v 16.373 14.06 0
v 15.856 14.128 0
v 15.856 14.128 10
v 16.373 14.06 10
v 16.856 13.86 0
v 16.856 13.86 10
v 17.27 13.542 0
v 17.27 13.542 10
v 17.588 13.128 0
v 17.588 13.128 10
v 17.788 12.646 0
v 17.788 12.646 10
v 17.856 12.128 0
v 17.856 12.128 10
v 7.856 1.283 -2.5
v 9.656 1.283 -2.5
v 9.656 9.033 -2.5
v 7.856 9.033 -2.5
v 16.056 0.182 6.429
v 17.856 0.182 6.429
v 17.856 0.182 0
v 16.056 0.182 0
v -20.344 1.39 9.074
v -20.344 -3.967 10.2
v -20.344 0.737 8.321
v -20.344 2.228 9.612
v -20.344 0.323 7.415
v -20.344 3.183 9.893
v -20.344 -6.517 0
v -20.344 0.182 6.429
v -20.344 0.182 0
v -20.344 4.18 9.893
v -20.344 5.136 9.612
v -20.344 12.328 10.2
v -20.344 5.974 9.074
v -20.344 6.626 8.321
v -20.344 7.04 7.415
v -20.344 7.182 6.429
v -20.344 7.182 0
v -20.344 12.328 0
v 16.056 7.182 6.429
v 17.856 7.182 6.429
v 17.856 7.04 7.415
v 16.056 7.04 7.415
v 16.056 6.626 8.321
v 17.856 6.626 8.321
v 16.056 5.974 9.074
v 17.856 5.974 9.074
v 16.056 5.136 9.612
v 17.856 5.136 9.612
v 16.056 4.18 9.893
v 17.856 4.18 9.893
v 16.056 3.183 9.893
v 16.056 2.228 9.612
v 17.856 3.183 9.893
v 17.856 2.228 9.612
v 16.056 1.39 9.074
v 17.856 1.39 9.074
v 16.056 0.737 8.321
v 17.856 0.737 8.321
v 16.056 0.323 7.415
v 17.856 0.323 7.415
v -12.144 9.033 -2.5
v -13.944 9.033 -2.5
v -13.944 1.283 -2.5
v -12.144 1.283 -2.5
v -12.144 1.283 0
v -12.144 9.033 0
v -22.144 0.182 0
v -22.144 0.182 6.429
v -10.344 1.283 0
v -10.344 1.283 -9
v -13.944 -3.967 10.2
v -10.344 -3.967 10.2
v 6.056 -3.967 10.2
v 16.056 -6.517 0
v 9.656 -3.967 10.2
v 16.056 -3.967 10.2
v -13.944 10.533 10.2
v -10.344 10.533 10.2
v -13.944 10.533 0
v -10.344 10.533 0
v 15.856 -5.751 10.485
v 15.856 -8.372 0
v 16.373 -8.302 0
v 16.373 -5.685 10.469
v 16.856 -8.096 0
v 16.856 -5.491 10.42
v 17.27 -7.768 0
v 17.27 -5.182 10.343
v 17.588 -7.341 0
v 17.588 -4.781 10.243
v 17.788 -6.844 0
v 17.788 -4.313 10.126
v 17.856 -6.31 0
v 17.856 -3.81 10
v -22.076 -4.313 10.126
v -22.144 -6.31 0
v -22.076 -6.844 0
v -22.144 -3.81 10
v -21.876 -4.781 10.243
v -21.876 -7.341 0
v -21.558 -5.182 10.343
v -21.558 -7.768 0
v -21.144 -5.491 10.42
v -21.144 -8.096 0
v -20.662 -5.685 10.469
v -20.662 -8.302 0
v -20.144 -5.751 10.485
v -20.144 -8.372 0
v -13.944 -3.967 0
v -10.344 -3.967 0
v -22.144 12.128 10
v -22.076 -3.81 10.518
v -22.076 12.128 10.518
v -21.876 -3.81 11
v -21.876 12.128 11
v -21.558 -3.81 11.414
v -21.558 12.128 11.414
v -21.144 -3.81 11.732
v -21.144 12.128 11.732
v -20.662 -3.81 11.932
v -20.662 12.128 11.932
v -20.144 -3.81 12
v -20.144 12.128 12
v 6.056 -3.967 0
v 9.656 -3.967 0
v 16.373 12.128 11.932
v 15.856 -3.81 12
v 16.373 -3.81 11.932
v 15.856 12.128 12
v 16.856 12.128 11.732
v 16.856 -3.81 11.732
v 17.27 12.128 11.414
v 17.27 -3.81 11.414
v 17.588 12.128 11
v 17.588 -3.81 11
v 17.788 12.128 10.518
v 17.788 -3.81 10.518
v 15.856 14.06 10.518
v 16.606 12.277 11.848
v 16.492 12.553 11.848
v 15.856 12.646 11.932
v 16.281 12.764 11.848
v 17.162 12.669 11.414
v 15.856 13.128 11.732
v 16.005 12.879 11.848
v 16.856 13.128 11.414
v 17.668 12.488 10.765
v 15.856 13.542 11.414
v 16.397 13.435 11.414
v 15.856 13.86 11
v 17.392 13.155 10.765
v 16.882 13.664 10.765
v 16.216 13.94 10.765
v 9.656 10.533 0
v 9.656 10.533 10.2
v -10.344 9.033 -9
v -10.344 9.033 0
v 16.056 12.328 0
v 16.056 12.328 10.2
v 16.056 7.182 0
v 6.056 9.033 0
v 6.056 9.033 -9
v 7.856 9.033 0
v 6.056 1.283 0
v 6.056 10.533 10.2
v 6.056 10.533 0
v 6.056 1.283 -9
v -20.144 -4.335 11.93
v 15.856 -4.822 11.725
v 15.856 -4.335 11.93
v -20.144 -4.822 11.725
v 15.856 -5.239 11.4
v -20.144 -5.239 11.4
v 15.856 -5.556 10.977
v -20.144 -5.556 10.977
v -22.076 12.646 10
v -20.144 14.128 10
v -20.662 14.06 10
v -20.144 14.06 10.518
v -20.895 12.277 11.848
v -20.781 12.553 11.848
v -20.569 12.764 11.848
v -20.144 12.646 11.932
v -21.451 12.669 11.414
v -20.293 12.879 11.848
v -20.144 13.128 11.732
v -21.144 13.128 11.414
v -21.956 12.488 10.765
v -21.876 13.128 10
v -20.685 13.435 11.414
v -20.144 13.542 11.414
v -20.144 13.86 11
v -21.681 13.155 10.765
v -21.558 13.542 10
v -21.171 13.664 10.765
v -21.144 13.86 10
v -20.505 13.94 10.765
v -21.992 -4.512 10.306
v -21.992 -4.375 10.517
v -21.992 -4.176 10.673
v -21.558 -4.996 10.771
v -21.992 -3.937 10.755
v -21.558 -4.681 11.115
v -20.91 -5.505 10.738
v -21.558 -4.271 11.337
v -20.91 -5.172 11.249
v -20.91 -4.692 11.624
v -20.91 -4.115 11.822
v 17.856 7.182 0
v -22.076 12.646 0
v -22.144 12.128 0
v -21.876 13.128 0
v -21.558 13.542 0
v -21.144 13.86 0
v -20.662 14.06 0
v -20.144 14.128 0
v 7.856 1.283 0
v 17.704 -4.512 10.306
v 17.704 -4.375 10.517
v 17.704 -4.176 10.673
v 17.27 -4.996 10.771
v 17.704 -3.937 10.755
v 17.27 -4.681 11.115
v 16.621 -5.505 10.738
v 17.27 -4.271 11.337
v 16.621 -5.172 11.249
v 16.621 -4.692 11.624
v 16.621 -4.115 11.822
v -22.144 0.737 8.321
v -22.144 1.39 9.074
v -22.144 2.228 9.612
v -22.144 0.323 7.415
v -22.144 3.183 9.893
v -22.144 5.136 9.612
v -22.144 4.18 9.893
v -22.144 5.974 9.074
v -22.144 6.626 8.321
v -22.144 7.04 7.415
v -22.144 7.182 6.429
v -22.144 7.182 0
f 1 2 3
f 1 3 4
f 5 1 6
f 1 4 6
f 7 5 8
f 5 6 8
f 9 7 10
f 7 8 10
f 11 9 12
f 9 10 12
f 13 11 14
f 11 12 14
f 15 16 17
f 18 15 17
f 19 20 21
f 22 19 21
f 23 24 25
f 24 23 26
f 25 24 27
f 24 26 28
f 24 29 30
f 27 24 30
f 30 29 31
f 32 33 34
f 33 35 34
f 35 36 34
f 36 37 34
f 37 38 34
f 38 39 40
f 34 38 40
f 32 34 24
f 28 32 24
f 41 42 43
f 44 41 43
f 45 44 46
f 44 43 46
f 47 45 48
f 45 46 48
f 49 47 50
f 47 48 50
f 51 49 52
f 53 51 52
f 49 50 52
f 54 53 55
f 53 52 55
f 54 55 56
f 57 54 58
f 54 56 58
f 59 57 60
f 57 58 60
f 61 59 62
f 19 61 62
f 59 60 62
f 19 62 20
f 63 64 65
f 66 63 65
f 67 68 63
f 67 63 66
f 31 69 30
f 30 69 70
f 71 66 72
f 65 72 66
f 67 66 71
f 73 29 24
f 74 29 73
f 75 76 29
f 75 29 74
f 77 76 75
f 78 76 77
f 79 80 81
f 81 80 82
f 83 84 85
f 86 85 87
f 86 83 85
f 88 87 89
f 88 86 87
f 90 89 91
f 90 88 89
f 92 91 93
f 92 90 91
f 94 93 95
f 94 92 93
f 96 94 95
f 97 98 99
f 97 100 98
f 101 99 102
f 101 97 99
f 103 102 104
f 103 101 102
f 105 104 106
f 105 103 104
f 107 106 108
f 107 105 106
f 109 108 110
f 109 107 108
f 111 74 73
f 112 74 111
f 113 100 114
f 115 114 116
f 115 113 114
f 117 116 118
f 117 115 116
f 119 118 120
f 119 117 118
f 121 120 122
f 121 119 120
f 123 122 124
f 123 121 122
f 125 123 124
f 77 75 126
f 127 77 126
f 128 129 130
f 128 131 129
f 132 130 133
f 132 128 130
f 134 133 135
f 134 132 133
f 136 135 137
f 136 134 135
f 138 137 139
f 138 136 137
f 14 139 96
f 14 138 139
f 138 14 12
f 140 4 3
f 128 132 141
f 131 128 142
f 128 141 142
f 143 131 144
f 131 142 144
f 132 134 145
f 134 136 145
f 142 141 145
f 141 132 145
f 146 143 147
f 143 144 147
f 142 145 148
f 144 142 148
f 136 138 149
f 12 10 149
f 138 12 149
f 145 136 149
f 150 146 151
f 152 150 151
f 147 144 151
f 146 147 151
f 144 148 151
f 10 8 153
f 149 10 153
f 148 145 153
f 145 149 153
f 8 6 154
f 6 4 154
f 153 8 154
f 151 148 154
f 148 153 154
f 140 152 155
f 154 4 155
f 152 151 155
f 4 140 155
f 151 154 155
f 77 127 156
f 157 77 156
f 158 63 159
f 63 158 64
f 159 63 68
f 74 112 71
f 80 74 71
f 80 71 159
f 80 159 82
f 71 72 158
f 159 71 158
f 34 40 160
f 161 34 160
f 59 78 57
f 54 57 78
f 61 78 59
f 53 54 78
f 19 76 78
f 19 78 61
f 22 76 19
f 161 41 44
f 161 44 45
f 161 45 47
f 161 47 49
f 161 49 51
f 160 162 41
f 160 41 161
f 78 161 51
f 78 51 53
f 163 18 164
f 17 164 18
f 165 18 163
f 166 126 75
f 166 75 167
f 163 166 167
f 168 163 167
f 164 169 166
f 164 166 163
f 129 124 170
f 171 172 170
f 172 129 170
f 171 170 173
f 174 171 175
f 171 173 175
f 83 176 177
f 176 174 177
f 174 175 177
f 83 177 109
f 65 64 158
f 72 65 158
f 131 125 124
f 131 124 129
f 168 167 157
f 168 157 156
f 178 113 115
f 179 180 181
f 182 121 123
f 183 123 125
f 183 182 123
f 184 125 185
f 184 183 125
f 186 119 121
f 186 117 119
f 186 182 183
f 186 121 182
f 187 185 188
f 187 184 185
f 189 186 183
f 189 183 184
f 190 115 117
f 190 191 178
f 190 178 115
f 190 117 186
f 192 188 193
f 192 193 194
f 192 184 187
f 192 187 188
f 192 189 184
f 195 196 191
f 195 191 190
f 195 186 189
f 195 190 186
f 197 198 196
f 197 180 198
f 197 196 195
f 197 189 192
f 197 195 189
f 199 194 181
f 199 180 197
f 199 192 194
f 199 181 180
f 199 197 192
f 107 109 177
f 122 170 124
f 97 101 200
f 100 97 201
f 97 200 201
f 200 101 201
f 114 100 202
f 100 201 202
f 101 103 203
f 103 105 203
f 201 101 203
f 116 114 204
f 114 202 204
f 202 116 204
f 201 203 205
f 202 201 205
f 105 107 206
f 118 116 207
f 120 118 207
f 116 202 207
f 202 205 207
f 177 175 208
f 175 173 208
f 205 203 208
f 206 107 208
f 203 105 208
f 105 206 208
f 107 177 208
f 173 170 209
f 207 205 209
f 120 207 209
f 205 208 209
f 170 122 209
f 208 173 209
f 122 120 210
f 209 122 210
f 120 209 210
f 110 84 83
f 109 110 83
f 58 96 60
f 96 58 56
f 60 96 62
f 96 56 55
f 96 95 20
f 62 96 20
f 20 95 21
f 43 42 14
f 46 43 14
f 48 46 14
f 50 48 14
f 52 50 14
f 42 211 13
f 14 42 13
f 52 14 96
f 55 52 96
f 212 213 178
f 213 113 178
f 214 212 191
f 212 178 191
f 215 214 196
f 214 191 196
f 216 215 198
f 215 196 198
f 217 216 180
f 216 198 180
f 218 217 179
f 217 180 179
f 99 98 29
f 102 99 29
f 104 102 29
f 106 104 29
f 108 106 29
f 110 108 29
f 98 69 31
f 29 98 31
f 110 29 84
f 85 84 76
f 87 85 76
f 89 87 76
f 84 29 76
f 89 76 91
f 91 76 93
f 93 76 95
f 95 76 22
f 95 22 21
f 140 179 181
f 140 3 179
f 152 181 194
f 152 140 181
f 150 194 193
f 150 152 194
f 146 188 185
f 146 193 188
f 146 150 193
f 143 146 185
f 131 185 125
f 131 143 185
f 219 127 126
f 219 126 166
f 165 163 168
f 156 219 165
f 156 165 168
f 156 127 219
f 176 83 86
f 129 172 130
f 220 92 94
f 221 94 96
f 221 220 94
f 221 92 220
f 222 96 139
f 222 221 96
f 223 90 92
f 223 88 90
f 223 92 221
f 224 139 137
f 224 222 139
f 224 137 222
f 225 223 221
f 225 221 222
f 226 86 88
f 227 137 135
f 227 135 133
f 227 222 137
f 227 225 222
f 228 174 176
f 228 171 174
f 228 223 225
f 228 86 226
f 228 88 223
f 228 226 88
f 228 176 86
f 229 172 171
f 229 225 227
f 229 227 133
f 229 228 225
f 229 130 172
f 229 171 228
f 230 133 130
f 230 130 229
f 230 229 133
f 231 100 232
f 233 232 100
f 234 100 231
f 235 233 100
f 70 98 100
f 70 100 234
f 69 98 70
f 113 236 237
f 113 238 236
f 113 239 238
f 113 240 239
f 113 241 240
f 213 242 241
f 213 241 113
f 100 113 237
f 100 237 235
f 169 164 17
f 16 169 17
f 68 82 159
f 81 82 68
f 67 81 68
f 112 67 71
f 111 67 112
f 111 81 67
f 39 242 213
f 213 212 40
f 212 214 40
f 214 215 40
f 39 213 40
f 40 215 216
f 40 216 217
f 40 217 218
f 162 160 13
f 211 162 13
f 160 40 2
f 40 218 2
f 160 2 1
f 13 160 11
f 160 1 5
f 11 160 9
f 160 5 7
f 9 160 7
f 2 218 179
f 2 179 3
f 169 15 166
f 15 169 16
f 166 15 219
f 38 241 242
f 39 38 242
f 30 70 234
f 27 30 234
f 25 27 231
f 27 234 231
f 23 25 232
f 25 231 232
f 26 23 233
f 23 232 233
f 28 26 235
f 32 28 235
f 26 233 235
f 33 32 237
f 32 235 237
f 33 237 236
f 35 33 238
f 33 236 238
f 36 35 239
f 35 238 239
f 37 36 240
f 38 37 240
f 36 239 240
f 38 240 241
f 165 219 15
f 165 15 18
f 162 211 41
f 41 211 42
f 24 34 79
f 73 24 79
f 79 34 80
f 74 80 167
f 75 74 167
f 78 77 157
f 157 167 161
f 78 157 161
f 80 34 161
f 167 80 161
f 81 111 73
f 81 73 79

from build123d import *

# Parameters (mm, degrees)
F0_W      = 40
F0_H      = 22.5
F1_DEPTH  = 12
F3_DEPTH  = 40
F4_T      = -1.8
F6_E4_W   = 14.5
F6_E4_H   = 19.2
F7_DEPTH  = 3.6
F8_E5_W   = 14.5
F8_E5_H   = 19.2
F9_DEPTH  = 3.6
F10_W     = 5.25
F10_H     = 9
F11_DEPTH = 3.7
F12_W     = 5.25
F12_H     = 9
F13_DEPTH = 3.7
F14_W     = 1.5
F14_H     = 9
F15_DEPTH = 3.6
F16_W     = 1.5
F16_H     = 9
F17_DEPTH = 3.6
F18_W     = 7.75
F18_H     = 2.5
F19_DEPTH = 1.8
F20_W     = 7.75
F20_H     = 2.5
F21_DEPTH = 1.8
F23_DEPTH = 7.75
F25_DEPTH = 7.75
F27_DEPTH = 1.8
F29_DEPTH = 1.8
F30_R     = 2


with BuildPart() as f1:
    # F0 (on Top) → F1 (new body)
    with BuildSketch(Plane.XY):
        with Locations((-2.1441839635, 2.8779831225)):
            Rectangle(F0_W, F0_H)
    extrude(amount=F1_DEPTH)

    # F2 (on face) → F3 (cut)
    with BuildSketch(Plane.YZ.offset(17.8558160365)):
        Polygon((-8.3720168775, 12), (-8.3720168775, 0), (-5.3720168775, 12), align=None)
    extrude(amount=-F3_DEPTH, mode=Mode.SUBTRACT)

    # F4
    f4_openings = [f1.faces().sort_by_distance(p)[0] for p in [
        (-2.144184, 2.877983, 0),
    ]]
    offset(amount=F4_T, openings=f4_openings)

    # F6_E4 (on explicit) → F7 (join)
    with BuildSketch(Plane(origin=(-10.3441839635, -3.966619346, 10.2), x_dir=(0, 1, 0), z_dir=(-1, 0, 0))):
        with Locations((7.25, 9.6)):
            Rectangle(F6_E4_W, F6_E4_H)
    extrude(amount=F7_DEPTH)

    # F8_E5 (on explicit) → F9 (join)
    with BuildSketch(Plane(origin=(6.0558160365, -3.966619346, 10.2), x_dir=(0, 1, 0), z_dir=(-1, 0, 0))):
        with Locations((7.25, 9.6)):
            Rectangle(F8_E5_W, F8_E5_H)
    extrude(amount=-F9_DEPTH)

    # F10 (on face) → F11 (cut)
    with BuildSketch(Plane.YZ.offset(9.6558160365)):
        with Locations((-1.341619346, -4.5)):
            Rectangle(F10_W, F10_H)
    extrude(amount=-F11_DEPTH, mode=Mode.SUBTRACT)

    # F12 (on face) → F13 (cut)
    with BuildSketch(Plane(origin=(-13.9441839635, 0, 0), x_dir=(0, -1, 0), z_dir=(-1, 0, 0))):
        with Locations((1.341619346, -4.5)):
            Rectangle(F12_W, F12_H)
    extrude(amount=-F13_DEPTH, mode=Mode.SUBTRACT)

    # F14 (on face) → F15 (cut)
    with BuildSketch(Plane.YZ.offset(9.6558160365)):
        with Locations((9.783380654, -4.5)):
            Rectangle(F14_W, F14_H)
    extrude(amount=-F15_DEPTH, mode=Mode.SUBTRACT)

    # F16 (on face) → F17 (cut)
    with BuildSketch(Plane(origin=(-13.9441839635, 0, 0), x_dir=(0, -1, 0), z_dir=(-1, 0, 0))):
        with Locations((-9.783380654, -4.5)):
            Rectangle(F16_W, F16_H)
    extrude(amount=-F17_DEPTH, mode=Mode.SUBTRACT)

    # F18 (on face) → F19 (cut)
    with BuildSketch(Plane(origin=(-13.9441839635, 0, 0), x_dir=(0, -1, 0), z_dir=(-1, 0, 0))):
        with Locations((-5.158380654, -1.25)):
            Rectangle(F18_W, F18_H)
    extrude(amount=-F19_DEPTH, mode=Mode.SUBTRACT)

    # F20 (on face) → F21 (cut)
    with BuildSketch(Plane.YZ.offset(9.6558160365)):
        with Locations((5.158380654, -1.25)):
            Rectangle(F20_W, F20_H)
    extrude(amount=-F21_DEPTH, mode=Mode.SUBTRACT)

    # F22 (on face) → F23 (cut)
    with BuildSketch(Plane(origin=(0, 9.033380654, 0), x_dir=(-1, 0, 0), z_dir=(0, 1, 0))):
        Polygon((-6.0558160365, -9), (-9.6558160365, -2.5), (-9.6558160365, -9), align=None)
    extrude(amount=-F23_DEPTH, mode=Mode.SUBTRACT)

    # F24 (on face) → F25 (cut)
    with BuildSketch(Plane(origin=(0, 9.033380654, 0), x_dir=(-1, 0, 0), z_dir=(0, 1, 0))):
        Polygon((13.9441839635, -9), (13.9441839635, -2.5), (10.3441839635, -9), align=None)
    extrude(amount=-F25_DEPTH, mode=Mode.SUBTRACT)

    # F26 (on face) → F27 (cut)
    with BuildSketch(Plane(origin=(-22.1441839635, 0, 0), x_dir=(0, -1, 0), z_dir=(-1, 0, 0))):
        with BuildLine():
            Line((-0.1815545511, 0), (-0.1815545511, 6.4285714286))
            ThreePointArc((-0.1815545511, 6.4285714286), (-3.6815545511, 2.9285714286), (-7.1815545511, 6.4285714286))
            Line((-7.1815545511, 6.4285714286), (-7.1815545511, 0))
            Line((-7.1815545511, 0), (-0.1815545511, 0))
        make_face()
        with BuildLine():
            ThreePointArc((-7.1815545511, 6.4285714286), (-3.6815545511, 2.9285714286), (-0.1815545511, 6.4285714286))
            ThreePointArc((-0.1815545511, 6.4285714286), (-3.6815545511, 9.9285714286), (-7.1815545511, 6.4285714286))
        make_face()
    extrude(amount=-F27_DEPTH, mode=Mode.SUBTRACT)

    # F28 (on face) → F29 (cut)
    with BuildSketch(Plane.YZ.offset(17.8558160365)):
        with BuildLine():
            ThreePointArc((0.1815545511, 6.4285714286), (3.6815545511, 2.9285714286), (7.1815545511, 6.4285714286))
            ThreePointArc((7.1815545511, 6.4285714286), (3.6815545511, 9.9285714286), (0.1815545511, 6.4285714286))
        make_face()
        with BuildLine():
            Line((7.1815545511, 0), (7.1815545511, 6.4285714286))
            ThreePointArc((7.1815545511, 6.4285714286), (3.6815545511, 2.9285714286), (0.1815545511, 6.4285714286))
            Line((0.1815545511, 6.4285714286), (0.1815545511, 0))
            Line((0.1815545511, 0), (7.1815545511, 0))
        make_face()
    extrude(amount=-F29_DEPTH, mode=Mode.SUBTRACT)

    # F30
    f30_edges = [f1.edges().sort_by_distance(p)[0] for p in [
        (17.855816, -6.872017, 6),
        (17.855816, 14.127983, 6),
        (17.855816, 4.377983, 12),
        (-22.144184, -6.872017, 6),
        (-22.144184, 14.127983, 6),
        (-22.144184, 4.377983, 12),
        (-2.144184, -5.372017, 12),
        (-2.144184, 14.127983, 12),
    ]]
    fillet(f30_edges, radius=F30_R)


solid = f1.part
